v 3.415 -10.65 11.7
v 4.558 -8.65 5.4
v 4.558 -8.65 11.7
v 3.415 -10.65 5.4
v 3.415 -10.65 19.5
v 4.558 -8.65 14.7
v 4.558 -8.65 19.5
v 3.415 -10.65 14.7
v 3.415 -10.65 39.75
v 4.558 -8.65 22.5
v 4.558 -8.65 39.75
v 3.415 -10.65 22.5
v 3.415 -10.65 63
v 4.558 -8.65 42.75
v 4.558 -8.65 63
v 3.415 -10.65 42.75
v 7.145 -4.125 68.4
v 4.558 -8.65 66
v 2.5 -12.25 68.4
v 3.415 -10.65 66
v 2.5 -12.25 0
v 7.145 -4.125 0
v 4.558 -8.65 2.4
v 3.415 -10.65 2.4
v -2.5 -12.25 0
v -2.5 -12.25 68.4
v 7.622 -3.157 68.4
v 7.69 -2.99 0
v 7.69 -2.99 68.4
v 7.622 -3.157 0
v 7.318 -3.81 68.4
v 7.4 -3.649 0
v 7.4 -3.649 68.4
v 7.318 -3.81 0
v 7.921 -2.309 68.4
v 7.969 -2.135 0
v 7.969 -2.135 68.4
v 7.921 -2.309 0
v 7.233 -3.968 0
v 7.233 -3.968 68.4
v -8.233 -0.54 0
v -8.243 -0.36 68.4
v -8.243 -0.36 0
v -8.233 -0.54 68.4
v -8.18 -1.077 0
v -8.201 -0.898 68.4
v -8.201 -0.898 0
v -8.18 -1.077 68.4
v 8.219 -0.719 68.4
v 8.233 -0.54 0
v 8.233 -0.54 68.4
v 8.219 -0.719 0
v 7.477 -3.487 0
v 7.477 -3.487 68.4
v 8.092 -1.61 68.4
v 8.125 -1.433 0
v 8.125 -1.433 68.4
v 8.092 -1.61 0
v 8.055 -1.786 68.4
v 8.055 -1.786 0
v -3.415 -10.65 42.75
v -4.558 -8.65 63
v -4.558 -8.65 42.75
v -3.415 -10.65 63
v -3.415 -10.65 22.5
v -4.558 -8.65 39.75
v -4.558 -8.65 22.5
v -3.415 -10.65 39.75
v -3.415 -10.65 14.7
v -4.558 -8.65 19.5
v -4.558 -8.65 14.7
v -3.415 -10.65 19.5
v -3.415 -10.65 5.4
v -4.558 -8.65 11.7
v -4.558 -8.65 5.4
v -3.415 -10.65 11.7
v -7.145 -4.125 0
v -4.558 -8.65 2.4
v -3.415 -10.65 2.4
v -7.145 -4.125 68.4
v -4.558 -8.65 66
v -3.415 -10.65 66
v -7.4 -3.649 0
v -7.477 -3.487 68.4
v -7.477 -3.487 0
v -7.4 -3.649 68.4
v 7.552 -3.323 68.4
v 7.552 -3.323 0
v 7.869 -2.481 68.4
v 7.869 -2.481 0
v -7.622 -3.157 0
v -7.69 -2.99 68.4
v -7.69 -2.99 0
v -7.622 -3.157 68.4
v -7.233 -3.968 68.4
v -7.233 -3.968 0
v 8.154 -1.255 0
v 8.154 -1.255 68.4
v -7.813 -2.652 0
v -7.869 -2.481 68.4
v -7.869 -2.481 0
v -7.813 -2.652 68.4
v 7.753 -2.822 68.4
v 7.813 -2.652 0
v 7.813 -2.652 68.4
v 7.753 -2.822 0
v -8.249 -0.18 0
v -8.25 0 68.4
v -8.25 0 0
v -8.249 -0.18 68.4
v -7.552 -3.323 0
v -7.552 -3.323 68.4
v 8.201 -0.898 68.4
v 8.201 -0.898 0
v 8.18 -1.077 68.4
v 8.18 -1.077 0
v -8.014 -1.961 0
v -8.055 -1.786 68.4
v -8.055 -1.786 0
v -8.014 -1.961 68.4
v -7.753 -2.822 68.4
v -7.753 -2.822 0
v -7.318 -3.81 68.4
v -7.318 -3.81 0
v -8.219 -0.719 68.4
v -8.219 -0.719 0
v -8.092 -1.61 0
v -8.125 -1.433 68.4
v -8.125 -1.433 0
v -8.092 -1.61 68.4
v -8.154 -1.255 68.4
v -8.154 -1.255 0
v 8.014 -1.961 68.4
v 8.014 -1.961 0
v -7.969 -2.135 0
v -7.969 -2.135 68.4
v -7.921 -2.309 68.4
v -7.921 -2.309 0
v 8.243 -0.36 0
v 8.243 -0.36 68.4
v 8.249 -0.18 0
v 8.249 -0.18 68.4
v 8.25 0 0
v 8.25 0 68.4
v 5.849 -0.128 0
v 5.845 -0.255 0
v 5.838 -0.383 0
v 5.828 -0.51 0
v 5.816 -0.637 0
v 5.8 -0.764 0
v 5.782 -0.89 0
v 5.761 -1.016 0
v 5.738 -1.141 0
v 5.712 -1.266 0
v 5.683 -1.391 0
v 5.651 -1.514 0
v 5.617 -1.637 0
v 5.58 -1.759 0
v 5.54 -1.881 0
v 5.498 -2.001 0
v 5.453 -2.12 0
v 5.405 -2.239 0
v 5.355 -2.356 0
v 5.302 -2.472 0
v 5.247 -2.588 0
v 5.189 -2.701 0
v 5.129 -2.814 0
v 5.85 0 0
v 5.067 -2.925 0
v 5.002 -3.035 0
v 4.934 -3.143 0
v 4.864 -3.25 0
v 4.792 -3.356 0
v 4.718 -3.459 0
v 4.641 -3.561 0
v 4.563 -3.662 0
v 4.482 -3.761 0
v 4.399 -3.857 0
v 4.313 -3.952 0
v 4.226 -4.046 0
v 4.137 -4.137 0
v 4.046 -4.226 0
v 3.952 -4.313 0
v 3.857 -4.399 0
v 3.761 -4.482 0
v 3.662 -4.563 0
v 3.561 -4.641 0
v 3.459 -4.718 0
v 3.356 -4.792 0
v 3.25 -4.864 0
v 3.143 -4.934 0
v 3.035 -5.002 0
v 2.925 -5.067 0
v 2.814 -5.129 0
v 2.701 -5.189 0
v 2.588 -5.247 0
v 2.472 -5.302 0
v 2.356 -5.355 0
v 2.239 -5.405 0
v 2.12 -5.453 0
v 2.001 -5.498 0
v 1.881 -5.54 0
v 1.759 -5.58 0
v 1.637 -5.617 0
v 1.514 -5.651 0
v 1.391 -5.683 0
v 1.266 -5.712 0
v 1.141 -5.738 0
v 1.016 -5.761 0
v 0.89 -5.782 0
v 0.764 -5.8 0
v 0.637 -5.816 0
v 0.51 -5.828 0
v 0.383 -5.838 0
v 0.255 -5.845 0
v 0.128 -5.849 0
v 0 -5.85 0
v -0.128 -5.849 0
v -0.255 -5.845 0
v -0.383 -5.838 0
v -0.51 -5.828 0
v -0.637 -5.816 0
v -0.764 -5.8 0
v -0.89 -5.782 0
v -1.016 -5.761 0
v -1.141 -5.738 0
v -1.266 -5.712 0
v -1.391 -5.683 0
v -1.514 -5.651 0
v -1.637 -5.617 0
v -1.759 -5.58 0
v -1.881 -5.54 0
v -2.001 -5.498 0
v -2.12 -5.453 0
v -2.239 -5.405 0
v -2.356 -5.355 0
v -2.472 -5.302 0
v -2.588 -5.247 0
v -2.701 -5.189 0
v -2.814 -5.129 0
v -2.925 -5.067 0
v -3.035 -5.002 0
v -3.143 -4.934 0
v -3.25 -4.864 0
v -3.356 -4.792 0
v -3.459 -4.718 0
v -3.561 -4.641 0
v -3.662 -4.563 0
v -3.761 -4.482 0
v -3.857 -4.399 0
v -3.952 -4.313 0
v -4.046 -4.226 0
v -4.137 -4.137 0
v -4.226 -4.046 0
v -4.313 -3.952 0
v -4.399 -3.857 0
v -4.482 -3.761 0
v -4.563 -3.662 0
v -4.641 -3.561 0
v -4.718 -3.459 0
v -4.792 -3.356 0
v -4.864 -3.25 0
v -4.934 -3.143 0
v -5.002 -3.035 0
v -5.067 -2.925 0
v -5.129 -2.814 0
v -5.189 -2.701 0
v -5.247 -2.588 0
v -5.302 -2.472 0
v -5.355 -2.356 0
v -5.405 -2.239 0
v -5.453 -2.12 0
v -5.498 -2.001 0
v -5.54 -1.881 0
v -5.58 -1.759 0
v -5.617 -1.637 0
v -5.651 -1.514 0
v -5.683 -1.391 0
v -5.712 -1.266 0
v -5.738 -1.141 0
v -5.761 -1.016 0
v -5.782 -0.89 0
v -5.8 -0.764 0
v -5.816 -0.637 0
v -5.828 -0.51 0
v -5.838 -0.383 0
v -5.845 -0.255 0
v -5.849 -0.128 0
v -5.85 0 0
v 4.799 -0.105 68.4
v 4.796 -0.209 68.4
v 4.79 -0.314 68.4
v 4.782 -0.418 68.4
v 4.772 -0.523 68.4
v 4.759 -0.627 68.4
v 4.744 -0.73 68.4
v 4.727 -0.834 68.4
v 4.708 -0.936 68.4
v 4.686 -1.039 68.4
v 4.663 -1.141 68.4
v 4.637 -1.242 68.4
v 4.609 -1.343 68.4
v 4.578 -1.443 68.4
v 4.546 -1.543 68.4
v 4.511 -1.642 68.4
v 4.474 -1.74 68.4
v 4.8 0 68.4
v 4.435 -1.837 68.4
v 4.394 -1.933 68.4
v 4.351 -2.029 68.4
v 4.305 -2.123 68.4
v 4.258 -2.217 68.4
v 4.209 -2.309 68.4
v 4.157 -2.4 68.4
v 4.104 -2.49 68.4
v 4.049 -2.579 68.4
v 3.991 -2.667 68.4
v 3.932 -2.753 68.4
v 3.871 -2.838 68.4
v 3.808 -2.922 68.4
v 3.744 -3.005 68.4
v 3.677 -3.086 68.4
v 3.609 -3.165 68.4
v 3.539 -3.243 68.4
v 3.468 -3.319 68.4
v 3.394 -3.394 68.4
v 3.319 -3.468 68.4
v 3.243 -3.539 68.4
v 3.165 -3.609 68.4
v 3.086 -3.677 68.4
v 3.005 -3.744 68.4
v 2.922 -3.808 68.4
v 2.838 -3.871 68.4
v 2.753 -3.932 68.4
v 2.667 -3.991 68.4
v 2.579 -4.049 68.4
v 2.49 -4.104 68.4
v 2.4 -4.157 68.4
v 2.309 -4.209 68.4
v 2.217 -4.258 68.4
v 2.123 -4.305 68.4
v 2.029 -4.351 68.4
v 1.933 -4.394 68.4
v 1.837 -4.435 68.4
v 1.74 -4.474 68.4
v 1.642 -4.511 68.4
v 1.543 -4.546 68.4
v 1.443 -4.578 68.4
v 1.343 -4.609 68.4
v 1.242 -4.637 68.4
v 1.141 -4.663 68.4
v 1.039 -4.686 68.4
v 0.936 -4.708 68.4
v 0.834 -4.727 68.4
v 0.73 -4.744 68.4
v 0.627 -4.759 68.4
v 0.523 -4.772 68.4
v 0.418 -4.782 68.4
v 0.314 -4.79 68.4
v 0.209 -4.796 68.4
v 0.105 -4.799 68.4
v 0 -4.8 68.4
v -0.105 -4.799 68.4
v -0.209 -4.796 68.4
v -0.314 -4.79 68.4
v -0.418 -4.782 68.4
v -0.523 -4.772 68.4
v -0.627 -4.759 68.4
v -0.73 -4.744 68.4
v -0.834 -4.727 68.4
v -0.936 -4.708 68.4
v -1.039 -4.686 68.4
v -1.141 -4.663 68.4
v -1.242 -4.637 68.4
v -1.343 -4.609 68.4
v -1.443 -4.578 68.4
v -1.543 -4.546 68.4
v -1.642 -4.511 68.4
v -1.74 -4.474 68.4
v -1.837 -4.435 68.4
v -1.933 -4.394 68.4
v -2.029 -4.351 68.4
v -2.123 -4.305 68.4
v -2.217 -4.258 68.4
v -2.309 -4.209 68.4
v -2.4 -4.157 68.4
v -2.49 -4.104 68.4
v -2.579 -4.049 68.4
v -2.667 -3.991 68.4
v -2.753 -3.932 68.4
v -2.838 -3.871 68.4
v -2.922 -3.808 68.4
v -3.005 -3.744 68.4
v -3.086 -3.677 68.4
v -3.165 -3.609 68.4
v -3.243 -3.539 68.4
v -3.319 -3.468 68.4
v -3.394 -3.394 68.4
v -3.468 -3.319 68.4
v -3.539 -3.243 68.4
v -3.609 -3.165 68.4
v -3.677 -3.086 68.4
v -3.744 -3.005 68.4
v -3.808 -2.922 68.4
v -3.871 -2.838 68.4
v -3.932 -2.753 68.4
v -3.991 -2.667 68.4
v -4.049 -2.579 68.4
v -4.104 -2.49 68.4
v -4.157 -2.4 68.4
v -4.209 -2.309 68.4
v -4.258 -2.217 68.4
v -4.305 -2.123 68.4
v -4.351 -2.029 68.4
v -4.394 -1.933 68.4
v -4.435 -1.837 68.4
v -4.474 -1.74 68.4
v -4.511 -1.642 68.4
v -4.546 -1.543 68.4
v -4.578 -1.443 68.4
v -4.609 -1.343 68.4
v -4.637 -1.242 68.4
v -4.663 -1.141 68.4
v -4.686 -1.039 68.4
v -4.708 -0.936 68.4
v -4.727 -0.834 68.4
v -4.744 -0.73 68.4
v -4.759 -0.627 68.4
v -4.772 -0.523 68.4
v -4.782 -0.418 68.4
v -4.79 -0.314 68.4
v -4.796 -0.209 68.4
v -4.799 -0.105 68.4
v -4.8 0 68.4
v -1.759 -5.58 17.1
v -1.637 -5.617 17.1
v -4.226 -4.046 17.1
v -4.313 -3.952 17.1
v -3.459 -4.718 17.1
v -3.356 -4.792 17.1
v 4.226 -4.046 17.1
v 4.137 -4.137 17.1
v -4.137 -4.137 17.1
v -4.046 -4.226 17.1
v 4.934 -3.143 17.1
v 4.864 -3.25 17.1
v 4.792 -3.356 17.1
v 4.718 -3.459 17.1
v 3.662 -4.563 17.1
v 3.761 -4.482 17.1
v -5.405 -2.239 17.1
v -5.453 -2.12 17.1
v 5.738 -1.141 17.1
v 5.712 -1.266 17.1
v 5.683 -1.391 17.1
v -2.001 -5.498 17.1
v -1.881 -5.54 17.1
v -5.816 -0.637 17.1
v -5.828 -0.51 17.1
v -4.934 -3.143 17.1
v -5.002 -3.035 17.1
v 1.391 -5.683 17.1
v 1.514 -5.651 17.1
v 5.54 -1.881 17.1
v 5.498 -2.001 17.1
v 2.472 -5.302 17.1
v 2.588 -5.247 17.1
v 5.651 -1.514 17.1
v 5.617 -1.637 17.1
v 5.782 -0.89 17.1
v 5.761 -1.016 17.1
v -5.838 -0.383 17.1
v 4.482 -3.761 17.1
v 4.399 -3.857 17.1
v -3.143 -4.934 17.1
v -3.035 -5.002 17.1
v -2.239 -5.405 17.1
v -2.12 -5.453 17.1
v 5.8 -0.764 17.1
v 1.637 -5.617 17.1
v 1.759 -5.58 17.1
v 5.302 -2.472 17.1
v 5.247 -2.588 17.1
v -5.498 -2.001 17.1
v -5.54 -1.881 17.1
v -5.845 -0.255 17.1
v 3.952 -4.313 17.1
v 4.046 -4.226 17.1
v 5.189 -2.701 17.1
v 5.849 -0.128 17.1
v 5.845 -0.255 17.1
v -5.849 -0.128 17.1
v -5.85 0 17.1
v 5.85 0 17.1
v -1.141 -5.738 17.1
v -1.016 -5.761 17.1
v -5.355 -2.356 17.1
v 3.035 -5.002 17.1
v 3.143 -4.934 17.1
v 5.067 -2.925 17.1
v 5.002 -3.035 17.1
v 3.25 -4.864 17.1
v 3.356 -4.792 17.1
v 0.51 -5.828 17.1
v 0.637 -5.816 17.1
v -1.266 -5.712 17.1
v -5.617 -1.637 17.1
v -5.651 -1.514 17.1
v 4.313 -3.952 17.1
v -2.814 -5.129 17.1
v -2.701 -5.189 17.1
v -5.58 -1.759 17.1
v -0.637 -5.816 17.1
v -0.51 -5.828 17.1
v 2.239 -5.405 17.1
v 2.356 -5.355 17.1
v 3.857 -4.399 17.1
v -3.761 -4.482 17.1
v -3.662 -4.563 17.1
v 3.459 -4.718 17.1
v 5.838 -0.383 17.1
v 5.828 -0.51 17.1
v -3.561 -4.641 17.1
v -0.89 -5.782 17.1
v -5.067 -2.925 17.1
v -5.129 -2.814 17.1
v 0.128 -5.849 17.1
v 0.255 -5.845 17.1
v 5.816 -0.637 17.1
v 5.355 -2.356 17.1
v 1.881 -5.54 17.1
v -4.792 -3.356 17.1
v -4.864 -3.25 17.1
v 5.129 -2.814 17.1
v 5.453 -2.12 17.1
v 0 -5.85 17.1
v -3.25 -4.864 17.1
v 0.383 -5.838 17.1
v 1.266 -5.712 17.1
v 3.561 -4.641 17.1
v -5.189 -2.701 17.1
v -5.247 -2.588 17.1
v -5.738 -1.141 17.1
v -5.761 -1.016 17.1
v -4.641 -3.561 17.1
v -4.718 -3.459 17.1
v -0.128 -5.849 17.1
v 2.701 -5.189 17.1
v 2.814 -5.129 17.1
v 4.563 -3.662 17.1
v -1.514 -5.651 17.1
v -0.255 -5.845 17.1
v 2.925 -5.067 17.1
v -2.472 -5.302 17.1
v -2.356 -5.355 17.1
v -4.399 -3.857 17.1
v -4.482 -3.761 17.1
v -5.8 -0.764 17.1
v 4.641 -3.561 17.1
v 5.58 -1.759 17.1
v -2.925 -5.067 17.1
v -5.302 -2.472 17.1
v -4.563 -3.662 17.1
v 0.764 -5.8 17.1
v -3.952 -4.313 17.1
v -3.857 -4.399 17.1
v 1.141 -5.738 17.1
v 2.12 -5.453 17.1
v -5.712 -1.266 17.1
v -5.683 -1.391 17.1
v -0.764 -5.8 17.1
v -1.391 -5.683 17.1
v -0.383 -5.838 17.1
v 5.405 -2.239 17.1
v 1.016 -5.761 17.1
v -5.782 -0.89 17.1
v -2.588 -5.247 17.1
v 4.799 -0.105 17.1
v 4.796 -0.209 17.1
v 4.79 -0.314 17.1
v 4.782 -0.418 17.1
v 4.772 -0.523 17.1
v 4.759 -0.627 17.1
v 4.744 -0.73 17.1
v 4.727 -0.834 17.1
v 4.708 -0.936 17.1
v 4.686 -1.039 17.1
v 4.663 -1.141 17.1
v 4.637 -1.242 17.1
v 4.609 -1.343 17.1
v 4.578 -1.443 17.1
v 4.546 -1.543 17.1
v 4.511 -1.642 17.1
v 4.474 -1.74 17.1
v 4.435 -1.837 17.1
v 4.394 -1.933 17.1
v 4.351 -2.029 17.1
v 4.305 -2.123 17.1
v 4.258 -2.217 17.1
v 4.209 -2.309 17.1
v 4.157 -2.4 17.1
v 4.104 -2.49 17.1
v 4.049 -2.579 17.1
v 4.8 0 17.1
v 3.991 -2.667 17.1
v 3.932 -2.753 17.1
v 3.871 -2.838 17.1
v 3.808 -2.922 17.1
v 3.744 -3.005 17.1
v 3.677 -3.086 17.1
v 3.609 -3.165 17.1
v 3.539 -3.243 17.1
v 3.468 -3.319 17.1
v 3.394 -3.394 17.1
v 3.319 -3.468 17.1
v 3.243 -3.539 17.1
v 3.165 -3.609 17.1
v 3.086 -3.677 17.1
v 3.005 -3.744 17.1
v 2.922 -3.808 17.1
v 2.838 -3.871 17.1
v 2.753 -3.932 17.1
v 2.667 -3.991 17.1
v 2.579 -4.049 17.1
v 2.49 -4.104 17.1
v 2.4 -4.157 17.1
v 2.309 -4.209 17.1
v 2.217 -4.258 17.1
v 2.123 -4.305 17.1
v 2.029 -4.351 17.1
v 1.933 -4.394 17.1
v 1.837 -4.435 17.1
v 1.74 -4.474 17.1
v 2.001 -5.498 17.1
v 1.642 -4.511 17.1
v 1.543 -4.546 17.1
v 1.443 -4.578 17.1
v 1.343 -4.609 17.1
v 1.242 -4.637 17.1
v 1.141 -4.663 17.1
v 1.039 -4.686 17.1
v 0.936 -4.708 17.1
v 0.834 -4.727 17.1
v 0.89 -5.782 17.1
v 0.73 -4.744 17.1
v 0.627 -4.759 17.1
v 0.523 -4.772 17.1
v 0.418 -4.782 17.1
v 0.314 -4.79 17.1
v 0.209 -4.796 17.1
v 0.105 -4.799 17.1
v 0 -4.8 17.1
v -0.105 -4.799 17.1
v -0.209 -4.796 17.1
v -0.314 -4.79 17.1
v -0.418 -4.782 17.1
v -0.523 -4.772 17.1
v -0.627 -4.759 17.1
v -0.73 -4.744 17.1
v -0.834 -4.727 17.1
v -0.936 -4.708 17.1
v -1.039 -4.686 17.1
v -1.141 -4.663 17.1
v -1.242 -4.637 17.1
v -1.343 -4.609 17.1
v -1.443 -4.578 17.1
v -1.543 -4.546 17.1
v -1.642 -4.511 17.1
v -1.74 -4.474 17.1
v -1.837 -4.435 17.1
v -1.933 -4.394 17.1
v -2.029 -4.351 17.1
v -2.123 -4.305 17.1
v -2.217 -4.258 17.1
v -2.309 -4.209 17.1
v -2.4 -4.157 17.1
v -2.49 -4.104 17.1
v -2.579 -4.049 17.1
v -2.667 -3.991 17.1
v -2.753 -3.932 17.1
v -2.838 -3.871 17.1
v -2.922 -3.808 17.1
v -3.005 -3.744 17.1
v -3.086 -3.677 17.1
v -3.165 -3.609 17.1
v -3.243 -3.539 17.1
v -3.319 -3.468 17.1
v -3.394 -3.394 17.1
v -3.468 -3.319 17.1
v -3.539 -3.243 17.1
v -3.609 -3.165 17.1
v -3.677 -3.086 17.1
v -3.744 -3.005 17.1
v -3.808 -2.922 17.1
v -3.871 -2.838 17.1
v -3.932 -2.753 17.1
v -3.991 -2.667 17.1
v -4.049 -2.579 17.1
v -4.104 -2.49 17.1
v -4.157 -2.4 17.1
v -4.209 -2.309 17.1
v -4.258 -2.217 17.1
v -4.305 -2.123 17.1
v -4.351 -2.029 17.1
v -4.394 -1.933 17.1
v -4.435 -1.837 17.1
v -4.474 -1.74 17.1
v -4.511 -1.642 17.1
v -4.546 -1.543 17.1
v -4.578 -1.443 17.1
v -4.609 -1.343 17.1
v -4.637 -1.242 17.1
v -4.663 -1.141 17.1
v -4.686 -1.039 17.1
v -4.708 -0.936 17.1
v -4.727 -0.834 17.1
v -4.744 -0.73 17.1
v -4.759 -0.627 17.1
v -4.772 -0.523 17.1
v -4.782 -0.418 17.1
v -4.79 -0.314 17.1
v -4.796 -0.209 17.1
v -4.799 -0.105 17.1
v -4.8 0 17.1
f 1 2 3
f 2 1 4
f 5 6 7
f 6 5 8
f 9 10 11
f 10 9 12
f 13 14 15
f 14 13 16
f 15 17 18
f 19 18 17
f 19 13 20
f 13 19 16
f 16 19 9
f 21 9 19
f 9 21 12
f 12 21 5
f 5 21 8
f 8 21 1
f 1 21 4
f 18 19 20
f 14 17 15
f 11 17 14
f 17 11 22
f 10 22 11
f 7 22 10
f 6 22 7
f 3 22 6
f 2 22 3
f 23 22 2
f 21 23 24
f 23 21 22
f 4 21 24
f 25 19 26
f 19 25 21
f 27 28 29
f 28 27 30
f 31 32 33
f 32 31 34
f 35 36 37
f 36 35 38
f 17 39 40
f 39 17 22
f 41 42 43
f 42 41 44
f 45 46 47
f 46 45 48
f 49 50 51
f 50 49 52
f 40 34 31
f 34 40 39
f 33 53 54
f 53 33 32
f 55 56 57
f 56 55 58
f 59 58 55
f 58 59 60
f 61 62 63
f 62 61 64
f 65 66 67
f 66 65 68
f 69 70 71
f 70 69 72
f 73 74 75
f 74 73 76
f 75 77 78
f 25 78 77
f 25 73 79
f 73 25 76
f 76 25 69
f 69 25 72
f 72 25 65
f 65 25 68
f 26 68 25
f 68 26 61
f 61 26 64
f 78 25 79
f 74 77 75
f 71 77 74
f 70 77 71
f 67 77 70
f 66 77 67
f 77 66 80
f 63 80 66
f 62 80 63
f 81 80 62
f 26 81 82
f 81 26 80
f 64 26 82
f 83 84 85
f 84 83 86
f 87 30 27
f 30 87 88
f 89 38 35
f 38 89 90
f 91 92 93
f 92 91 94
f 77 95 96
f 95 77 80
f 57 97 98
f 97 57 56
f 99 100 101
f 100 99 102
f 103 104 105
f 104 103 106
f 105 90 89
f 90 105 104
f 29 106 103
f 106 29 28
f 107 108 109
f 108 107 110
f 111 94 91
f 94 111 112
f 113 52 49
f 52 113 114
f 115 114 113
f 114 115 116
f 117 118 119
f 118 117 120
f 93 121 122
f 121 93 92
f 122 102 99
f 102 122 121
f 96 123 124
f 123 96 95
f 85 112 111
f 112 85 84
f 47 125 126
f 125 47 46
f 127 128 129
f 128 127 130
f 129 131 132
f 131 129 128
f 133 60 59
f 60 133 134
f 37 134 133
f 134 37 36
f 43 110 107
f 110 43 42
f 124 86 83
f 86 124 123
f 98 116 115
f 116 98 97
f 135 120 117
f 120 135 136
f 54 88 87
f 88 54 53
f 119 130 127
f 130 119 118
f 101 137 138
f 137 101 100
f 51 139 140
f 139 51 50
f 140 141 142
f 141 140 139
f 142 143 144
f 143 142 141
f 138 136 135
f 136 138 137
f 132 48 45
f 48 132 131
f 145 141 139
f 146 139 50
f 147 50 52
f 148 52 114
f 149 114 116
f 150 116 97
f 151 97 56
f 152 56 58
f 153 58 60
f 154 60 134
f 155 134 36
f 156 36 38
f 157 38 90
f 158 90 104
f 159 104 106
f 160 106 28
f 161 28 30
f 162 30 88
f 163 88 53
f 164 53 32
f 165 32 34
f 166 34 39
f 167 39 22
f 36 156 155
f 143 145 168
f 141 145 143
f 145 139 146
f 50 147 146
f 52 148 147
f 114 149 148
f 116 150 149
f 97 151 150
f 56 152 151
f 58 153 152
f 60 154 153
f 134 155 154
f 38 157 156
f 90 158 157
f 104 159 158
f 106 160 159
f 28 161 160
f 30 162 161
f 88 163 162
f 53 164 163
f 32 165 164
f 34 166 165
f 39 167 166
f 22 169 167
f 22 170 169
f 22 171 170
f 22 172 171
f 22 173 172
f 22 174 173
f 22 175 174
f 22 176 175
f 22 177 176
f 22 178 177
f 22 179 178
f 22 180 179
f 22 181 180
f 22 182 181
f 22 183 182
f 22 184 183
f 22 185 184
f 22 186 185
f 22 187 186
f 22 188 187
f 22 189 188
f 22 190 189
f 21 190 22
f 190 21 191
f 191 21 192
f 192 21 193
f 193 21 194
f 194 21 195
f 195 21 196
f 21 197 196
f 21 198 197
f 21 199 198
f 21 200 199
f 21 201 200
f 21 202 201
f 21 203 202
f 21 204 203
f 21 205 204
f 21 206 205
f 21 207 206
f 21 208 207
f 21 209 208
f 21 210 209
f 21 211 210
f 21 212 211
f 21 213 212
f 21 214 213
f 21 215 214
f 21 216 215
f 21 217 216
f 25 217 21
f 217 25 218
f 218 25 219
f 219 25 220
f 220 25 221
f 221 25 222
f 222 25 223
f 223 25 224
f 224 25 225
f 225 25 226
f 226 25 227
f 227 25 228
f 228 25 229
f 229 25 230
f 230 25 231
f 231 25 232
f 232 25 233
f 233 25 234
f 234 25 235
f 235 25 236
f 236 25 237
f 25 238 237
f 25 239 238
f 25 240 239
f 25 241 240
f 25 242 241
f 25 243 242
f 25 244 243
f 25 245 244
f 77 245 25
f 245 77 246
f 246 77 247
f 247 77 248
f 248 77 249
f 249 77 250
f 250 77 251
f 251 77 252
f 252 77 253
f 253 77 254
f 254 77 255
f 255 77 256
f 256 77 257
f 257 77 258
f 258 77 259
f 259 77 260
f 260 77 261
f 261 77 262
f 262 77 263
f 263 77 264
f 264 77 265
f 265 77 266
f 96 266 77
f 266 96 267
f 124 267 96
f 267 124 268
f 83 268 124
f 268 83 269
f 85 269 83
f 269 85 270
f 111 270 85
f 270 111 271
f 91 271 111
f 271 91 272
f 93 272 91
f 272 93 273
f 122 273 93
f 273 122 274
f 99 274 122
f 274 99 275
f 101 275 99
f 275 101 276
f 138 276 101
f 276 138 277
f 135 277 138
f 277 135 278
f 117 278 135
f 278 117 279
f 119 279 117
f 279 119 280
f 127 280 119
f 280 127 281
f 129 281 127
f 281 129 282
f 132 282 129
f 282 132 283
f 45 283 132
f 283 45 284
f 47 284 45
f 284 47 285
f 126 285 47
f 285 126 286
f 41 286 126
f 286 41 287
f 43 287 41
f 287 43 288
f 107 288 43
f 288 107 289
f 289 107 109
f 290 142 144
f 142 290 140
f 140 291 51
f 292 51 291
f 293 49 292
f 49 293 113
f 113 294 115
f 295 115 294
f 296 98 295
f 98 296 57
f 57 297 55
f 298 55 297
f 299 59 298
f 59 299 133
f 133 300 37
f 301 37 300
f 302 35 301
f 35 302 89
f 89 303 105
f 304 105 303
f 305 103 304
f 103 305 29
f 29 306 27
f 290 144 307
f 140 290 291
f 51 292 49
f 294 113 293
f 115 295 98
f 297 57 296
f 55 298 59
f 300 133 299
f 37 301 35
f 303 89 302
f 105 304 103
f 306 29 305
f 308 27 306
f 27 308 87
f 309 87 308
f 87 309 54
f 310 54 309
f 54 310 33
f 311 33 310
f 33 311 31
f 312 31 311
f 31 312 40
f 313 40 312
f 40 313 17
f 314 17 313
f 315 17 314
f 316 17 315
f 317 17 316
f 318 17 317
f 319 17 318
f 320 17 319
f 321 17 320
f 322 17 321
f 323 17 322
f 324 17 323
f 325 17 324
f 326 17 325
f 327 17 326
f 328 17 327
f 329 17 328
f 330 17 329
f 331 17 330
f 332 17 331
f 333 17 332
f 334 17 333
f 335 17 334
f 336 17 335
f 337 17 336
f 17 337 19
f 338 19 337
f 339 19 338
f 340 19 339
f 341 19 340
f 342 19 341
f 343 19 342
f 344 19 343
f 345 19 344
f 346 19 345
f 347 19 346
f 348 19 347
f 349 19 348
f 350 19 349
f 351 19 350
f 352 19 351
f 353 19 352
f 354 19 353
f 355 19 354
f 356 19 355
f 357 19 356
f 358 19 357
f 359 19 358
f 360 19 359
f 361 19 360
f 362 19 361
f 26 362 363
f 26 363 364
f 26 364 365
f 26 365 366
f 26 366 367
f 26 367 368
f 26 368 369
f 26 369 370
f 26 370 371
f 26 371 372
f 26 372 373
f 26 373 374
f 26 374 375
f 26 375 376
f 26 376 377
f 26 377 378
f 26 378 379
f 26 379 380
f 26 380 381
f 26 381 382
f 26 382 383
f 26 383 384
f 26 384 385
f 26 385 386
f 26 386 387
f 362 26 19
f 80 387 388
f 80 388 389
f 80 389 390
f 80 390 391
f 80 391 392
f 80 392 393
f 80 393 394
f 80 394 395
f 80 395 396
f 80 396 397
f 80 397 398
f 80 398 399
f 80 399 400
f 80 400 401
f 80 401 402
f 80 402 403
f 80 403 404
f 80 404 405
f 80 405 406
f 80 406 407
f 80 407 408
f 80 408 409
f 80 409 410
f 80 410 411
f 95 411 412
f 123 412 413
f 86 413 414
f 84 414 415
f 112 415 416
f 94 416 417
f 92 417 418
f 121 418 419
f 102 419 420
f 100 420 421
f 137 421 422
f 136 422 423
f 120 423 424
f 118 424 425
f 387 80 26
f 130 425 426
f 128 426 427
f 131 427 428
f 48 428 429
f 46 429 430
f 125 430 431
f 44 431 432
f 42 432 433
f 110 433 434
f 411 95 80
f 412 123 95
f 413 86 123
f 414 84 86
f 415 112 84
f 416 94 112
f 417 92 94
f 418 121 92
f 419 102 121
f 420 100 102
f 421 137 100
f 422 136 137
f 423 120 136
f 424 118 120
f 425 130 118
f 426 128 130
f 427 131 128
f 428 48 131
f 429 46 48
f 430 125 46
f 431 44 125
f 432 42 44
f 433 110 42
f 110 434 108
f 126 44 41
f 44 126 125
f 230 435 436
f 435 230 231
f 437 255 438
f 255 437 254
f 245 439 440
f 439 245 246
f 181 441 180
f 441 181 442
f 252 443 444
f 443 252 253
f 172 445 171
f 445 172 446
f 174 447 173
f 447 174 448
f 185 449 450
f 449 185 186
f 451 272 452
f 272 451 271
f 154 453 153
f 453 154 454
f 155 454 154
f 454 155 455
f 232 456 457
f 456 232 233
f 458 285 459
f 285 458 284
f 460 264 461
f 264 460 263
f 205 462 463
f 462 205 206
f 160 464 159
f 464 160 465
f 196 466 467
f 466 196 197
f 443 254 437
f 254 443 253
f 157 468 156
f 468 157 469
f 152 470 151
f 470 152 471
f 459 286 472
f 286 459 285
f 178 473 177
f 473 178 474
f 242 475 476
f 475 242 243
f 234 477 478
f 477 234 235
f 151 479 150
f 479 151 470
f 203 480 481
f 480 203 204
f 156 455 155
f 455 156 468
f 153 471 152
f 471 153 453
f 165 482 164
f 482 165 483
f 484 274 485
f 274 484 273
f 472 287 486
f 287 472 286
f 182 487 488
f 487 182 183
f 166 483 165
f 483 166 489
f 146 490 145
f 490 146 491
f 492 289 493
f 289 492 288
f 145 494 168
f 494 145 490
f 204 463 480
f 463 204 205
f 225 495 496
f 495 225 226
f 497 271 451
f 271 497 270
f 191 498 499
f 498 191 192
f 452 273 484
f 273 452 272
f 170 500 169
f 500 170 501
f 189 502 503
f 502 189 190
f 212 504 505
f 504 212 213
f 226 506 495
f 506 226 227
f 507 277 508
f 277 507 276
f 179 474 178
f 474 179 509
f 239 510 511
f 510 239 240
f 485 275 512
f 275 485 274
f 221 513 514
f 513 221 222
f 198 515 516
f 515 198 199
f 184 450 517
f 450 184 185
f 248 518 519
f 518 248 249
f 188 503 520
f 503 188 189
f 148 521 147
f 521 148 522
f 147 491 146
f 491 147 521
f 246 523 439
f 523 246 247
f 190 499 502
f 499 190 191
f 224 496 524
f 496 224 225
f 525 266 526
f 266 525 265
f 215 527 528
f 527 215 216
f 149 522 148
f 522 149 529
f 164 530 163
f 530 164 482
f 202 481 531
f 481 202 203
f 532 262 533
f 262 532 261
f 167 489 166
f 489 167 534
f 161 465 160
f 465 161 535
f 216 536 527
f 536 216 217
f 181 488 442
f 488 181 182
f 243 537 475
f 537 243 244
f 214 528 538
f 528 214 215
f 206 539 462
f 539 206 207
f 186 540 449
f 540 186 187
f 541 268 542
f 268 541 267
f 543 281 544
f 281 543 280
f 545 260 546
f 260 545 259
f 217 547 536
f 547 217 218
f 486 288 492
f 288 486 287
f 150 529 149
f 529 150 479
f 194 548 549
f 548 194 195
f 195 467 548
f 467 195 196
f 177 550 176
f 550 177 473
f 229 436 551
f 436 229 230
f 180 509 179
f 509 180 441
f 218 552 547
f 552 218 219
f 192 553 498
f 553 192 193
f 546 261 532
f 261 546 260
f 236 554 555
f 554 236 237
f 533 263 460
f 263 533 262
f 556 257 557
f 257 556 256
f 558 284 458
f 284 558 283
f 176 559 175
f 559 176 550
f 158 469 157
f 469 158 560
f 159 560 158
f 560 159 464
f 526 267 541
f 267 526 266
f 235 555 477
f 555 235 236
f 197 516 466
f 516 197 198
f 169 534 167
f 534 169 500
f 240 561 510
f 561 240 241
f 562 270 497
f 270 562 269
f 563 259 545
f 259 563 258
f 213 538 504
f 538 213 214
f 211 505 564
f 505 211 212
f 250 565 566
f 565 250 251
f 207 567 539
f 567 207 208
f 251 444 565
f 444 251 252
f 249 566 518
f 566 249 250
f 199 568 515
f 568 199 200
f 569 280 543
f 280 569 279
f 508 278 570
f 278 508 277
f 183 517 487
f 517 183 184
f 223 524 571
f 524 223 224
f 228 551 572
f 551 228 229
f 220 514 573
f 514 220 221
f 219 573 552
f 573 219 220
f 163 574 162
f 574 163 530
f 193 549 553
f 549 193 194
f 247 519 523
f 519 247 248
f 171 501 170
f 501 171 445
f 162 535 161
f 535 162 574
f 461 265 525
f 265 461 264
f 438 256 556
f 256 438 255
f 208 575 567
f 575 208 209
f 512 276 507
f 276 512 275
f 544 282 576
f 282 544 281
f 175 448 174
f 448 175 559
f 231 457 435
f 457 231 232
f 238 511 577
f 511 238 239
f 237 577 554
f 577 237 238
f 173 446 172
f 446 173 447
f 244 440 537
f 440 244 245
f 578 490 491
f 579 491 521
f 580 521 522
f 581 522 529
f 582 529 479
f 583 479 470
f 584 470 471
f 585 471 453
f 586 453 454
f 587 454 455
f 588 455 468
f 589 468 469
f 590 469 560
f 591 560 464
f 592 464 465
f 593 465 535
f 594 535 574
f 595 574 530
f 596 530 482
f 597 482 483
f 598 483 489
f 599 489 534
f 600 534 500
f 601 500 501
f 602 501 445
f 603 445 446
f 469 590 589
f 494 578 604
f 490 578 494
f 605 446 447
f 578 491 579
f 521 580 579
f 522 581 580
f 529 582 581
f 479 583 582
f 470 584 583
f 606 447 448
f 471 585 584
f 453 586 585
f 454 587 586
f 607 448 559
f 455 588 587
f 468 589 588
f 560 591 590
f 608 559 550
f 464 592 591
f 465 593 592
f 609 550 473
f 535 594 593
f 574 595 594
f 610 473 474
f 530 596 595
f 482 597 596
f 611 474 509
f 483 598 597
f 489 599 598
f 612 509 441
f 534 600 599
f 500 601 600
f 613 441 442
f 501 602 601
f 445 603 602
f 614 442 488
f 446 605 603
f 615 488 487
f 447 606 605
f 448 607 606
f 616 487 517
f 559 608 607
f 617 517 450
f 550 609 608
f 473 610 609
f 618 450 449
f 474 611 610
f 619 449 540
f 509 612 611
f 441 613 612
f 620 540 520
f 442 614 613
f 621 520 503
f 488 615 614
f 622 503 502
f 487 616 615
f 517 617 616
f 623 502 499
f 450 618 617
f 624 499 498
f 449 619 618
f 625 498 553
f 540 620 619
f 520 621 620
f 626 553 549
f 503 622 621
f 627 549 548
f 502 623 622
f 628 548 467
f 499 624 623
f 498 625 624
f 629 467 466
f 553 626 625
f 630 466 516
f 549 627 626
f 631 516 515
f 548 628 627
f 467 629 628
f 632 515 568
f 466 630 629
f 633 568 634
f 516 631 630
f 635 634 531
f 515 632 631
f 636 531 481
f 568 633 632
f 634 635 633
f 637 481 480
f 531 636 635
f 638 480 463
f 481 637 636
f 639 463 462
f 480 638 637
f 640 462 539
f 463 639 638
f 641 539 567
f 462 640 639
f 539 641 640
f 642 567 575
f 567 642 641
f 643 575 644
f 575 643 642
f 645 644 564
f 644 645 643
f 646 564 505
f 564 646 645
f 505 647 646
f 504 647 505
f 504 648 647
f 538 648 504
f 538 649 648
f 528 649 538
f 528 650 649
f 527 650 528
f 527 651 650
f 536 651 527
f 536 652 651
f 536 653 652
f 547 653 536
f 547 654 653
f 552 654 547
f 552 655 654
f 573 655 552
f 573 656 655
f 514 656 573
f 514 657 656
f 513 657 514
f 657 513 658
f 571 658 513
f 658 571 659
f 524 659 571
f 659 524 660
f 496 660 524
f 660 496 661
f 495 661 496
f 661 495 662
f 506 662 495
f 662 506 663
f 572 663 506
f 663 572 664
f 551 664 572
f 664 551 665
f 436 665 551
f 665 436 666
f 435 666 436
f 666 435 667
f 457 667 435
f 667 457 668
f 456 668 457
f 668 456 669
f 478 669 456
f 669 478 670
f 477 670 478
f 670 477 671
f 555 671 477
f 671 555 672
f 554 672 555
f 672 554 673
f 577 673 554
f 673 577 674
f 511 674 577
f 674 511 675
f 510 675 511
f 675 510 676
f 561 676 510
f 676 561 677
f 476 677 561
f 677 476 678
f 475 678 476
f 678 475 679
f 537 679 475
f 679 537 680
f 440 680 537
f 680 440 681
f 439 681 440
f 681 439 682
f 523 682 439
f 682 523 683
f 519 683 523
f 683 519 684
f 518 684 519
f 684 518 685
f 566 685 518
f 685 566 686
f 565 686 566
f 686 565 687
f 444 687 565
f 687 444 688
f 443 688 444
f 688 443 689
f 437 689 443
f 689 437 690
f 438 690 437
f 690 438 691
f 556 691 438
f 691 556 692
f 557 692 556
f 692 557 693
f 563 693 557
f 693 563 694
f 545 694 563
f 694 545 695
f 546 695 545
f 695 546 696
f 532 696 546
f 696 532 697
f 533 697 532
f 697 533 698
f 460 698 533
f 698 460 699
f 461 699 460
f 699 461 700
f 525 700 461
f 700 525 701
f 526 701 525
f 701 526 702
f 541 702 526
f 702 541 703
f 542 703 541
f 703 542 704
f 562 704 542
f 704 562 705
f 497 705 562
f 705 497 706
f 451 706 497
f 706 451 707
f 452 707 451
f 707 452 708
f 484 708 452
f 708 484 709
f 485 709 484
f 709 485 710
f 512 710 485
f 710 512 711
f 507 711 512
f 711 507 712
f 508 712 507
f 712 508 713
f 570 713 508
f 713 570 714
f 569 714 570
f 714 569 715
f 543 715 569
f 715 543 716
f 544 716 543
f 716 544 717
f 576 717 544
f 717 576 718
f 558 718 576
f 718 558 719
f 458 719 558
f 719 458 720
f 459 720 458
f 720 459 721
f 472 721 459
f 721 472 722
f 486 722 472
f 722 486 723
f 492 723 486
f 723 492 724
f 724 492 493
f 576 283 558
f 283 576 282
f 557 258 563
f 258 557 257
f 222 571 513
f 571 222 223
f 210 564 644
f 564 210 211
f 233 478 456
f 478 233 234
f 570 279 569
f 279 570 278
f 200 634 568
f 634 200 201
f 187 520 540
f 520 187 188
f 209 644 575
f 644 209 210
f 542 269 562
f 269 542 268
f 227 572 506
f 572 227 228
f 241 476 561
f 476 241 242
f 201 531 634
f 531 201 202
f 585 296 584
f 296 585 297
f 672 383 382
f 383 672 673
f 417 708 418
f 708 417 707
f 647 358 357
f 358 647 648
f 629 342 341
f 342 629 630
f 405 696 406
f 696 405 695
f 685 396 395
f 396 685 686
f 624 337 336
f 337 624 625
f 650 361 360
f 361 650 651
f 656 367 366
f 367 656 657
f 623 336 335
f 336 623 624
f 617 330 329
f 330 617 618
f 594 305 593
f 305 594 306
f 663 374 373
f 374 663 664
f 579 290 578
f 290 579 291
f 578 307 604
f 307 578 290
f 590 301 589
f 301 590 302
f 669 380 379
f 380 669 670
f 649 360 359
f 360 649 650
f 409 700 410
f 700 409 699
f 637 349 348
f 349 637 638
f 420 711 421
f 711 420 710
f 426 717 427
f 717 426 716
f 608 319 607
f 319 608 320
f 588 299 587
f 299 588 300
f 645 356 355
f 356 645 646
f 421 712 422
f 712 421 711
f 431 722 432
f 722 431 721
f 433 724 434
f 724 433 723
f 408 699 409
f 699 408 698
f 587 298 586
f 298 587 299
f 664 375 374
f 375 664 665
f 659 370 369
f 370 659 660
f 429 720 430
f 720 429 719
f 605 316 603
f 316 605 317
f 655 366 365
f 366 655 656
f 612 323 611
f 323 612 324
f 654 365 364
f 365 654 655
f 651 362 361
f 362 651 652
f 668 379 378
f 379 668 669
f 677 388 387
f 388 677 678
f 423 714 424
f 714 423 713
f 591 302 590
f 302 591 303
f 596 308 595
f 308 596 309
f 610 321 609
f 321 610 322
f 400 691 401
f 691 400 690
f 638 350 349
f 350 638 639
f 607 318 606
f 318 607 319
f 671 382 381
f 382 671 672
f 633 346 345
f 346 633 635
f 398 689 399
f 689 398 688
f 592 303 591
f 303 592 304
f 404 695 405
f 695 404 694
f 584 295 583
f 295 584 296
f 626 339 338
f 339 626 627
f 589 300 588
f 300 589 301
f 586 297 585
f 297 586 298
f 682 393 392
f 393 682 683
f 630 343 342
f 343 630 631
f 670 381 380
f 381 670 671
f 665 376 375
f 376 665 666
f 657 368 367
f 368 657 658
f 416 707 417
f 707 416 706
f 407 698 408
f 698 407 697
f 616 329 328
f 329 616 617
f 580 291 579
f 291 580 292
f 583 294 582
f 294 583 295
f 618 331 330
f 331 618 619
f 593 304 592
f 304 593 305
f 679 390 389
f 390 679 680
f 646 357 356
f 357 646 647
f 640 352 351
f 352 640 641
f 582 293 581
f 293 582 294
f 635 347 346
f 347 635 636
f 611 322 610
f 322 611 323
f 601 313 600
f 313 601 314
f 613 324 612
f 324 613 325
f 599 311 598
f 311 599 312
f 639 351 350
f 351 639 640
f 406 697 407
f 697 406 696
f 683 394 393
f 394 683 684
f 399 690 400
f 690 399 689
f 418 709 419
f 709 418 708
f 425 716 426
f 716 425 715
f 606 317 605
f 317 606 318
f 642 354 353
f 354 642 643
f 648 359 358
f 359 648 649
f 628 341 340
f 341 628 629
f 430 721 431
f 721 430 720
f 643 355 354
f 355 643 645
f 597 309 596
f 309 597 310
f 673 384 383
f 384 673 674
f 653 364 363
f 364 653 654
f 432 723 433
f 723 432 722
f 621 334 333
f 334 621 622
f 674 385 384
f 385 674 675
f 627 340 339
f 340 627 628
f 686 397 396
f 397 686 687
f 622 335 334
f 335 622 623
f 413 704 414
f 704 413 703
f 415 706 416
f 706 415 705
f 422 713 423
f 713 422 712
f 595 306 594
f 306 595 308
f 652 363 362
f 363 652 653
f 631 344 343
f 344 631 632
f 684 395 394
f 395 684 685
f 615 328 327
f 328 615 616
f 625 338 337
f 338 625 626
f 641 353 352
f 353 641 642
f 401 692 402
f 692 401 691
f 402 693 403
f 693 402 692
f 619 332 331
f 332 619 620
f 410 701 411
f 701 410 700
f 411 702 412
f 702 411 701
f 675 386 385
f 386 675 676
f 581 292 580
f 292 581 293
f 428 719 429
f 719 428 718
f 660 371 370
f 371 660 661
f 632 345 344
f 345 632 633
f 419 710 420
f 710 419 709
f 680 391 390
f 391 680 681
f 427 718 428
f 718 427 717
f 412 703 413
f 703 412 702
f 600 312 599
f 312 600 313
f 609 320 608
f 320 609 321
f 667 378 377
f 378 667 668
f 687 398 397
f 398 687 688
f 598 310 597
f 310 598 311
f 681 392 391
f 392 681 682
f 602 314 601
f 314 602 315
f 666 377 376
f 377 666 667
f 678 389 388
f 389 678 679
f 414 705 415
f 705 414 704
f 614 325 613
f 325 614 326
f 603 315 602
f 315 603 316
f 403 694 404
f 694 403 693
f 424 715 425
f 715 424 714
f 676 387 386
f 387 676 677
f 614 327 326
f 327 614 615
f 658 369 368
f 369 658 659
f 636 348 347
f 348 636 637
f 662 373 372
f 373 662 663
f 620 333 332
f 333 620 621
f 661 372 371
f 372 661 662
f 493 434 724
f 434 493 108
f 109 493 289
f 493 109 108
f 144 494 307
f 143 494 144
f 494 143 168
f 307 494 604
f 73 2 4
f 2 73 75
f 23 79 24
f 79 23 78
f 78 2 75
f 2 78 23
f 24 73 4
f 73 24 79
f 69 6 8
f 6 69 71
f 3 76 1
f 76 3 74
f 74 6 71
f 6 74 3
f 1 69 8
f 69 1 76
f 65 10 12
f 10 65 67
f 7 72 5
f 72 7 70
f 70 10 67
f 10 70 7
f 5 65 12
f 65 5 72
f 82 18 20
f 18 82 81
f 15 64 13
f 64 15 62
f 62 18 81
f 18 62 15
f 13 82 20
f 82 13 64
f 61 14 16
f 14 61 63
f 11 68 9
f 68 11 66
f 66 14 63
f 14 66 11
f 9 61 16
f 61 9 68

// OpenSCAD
min_thickness=1.2;
2min_thickness=2 * min_thickness;
clearance_tight=0.2;
clearance_loose=0.4;
fn=72 * 4;
$fn=fn;

lower_section_id=10.9 + (2 * clearance_loose);
lower_section_z=17.1;
lower_screw_distance_from_top_z=4.6;
lower_screw_diameter=4.2 + (2 * clearance_loose);

upper_section_id=9.2 + (2 * clearance_tight);
upper_section_z=lower_section_z * 3;

max_or=max(upper_section_id / 2, lower_section_id / 2) + 2min_thickness;

ziptie_xy=2;
ziptie_z=3;

module cylinder_outer(height,radius,center=false){
    fudge = 1/cos(180/fn);
    cylinder(h=height,r=radius*fudge, center=center);
}

total_z = lower_section_z + upper_section_z;

module ZipTieCutThrough() {
    translate([-max_or, -max_or - 2min_thickness, 0]) cube([max_or * 2, ziptie_xy, ziptie_z]);
}

difference() {
    union() {
        hull() {
            cylinder_outer(total_z, max_or);
            translate([-lower_screw_diameter / 2, -max_or - ziptie_xy * 2, 0]) cube([lower_screw_diameter, ziptie_xy * 2, total_z]);
        }
    }
    // lower section
    cylinder_outer(lower_section_z, lower_section_id / 2);
    // upper section
    translate([0, 0, lower_section_z]) {
        cylinder_outer(upper_section_z, upper_section_id / 2);
    }

    translate([-max_or - .5, 0, 0]) cube([max_or * 2 + 1, max_or + 1, total_z]);

    translate([0, 0, 2min_thickness]) ZipTieCutThrough();

    translate([0, 0, lower_section_z - ziptie_z - 2min_thickness]) ZipTieCutThrough();

    translate([0, 0, lower_section_z + 2min_thickness]) ZipTieCutThrough();

    translate([0, 0, total_z - ziptie_z - 2min_thickness]) ZipTieCutThrough();

    translate([0, 0, lower_section_z + (upper_section_z / 2) - ziptie_z]) ZipTieCutThrough();
}
